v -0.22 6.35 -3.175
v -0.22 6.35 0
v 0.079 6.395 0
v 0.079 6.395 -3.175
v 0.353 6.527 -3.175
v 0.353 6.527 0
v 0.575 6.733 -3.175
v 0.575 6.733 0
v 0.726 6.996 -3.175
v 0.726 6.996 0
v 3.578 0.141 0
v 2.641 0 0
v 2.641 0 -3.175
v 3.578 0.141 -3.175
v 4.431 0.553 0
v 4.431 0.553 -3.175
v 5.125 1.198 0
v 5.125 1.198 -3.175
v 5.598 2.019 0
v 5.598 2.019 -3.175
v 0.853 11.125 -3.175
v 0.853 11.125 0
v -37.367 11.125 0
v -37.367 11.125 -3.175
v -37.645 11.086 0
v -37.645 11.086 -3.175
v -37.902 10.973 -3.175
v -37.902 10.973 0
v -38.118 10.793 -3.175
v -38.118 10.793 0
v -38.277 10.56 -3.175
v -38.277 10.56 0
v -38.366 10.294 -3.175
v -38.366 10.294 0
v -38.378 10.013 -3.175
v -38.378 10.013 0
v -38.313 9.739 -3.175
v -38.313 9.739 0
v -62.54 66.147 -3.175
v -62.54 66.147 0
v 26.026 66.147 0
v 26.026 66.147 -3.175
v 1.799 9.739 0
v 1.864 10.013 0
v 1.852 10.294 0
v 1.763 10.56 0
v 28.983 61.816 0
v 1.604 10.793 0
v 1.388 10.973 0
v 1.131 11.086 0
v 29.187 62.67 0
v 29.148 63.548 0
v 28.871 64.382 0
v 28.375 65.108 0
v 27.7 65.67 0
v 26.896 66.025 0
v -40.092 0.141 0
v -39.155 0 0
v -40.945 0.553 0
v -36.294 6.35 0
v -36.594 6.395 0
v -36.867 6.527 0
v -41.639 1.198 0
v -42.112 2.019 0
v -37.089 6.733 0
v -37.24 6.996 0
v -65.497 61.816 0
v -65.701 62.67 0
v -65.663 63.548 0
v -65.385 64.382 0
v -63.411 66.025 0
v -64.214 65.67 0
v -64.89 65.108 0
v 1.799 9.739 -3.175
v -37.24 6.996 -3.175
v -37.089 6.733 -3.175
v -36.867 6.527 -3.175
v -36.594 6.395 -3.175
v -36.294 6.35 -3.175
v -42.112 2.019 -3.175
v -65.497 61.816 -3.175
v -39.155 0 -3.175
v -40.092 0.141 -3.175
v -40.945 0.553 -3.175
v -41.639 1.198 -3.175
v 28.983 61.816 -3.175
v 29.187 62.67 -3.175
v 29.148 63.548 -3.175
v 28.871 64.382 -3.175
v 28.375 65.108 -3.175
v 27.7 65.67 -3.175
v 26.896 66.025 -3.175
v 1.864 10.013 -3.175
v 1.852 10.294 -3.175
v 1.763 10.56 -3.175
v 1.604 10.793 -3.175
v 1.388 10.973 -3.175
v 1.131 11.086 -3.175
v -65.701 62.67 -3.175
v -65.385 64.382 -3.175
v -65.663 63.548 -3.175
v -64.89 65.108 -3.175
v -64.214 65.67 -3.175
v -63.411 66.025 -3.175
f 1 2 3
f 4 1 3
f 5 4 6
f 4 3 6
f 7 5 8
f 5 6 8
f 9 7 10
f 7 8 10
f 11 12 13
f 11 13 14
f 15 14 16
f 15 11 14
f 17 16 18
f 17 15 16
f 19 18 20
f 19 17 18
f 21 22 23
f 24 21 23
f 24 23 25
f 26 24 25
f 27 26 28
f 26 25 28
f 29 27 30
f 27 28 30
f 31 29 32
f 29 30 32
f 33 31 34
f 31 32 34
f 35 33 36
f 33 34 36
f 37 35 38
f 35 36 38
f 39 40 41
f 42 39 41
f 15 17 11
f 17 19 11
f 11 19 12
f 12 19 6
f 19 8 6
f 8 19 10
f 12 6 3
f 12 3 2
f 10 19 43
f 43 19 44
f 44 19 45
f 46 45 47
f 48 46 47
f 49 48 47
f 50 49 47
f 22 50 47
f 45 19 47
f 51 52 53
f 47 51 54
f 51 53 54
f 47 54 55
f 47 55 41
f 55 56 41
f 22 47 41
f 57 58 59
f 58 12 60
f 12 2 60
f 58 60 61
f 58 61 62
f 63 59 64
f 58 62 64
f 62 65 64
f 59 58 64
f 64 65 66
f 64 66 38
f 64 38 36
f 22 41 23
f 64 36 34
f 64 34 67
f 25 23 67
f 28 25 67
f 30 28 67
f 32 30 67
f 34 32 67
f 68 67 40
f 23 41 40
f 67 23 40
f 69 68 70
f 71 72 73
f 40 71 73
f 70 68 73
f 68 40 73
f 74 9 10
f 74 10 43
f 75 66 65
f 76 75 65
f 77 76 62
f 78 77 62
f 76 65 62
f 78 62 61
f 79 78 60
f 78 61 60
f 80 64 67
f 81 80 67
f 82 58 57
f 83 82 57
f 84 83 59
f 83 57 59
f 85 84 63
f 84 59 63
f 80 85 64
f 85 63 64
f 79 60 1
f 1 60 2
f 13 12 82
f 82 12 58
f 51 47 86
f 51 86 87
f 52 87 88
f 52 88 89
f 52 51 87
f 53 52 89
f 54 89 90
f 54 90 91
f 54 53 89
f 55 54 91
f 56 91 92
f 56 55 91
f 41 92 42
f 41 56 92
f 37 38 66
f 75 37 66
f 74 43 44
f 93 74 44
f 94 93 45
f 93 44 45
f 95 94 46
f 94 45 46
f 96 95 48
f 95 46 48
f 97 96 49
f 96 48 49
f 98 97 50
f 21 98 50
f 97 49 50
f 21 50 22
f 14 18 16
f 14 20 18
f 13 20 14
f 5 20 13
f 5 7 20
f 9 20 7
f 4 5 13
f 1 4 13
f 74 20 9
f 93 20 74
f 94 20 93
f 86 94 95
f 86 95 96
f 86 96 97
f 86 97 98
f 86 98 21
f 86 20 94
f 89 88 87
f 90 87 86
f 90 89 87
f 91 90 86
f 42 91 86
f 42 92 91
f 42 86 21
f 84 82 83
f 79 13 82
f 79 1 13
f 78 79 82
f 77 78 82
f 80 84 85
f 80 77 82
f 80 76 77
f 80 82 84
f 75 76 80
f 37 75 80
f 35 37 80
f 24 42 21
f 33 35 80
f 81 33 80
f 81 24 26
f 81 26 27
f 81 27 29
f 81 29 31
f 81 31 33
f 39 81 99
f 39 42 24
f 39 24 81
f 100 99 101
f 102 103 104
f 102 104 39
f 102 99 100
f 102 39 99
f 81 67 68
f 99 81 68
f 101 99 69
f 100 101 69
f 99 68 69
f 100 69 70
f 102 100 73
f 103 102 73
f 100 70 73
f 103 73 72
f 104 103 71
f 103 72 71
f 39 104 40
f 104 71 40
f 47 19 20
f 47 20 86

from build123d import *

# Parameters (mm, degrees)
EXTRUDE1_DEPTH = 3.175
EXTRUDE2_DEPTH = 94.295303002


with BuildPart() as part:
    # Sketch1 → Extrude1 (new body)
    with BuildSketch(Plane.XY):
        with BuildLine():
            Line((-18.257091065, 0), (2.640813879, 0))
            ThreePointArc((2.640813879, 0), (4.430938656, 0.552772267), (5.59773661, 2.018612104))
            Line((5.59773661, 2.018612104), (28.983052402, 61.815650828))
            ThreePointArc((28.983052402, 61.815650828), (28.648357405, 64.762163501), (26.026129672, 66.147038724))
            Line((26.026129672, 66.147038724), (-18.257091065, 66.147038724))
            Line((-18.257091065, 66.147038724), (-18.257091065, 0))
        make_face()
    extrude(amount=-EXTRUDE1_DEPTH)

    # Mirror1: part across plane


with BuildPart() as part_1:
    add(part.part)
    add(part.part.mirror(Plane(origin=(-18.257091065, 66.147038724, -3.175), x_dir=(0, 0, 1), z_dir=(-1, 0, 0))))

    # Sketch2 → Extrude2 (cut, through all)
    with BuildSketch(Plane.XY):
        with BuildLine():
            Line((0.725945487, 6.995955873), (1.798751091, 9.739155873))
            ThreePointArc((1.798751091, 9.739155873), (1.691648692, 10.682039928), (0.852535818, 11.1252))
            Line((0.852535818, 11.1252), (-37.366717948, 11.1252))
            ThreePointArc((-37.366717948, 11.1252), (-38.205830822, 10.682039928), (-38.312933221, 9.739155873))
            Line((-38.312933221, 9.739155873), (-37.240127617, 6.995955873))
            ThreePointArc((-37.240127617, 6.995955873), (-36.866752272, 6.526887125), (-36.293912343, 6.35))
            Line((-36.293912343, 6.35), (-0.220269787, 6.35))
            ThreePointArc((-0.220269787, 6.35), (0.352570142, 6.526887125), (0.725945487, 6.995955873))
        make_face()
    extrude(amount=-EXTRUDE2_DEPTH, mode=Mode.SUBTRACT)


solid = part_1.part
